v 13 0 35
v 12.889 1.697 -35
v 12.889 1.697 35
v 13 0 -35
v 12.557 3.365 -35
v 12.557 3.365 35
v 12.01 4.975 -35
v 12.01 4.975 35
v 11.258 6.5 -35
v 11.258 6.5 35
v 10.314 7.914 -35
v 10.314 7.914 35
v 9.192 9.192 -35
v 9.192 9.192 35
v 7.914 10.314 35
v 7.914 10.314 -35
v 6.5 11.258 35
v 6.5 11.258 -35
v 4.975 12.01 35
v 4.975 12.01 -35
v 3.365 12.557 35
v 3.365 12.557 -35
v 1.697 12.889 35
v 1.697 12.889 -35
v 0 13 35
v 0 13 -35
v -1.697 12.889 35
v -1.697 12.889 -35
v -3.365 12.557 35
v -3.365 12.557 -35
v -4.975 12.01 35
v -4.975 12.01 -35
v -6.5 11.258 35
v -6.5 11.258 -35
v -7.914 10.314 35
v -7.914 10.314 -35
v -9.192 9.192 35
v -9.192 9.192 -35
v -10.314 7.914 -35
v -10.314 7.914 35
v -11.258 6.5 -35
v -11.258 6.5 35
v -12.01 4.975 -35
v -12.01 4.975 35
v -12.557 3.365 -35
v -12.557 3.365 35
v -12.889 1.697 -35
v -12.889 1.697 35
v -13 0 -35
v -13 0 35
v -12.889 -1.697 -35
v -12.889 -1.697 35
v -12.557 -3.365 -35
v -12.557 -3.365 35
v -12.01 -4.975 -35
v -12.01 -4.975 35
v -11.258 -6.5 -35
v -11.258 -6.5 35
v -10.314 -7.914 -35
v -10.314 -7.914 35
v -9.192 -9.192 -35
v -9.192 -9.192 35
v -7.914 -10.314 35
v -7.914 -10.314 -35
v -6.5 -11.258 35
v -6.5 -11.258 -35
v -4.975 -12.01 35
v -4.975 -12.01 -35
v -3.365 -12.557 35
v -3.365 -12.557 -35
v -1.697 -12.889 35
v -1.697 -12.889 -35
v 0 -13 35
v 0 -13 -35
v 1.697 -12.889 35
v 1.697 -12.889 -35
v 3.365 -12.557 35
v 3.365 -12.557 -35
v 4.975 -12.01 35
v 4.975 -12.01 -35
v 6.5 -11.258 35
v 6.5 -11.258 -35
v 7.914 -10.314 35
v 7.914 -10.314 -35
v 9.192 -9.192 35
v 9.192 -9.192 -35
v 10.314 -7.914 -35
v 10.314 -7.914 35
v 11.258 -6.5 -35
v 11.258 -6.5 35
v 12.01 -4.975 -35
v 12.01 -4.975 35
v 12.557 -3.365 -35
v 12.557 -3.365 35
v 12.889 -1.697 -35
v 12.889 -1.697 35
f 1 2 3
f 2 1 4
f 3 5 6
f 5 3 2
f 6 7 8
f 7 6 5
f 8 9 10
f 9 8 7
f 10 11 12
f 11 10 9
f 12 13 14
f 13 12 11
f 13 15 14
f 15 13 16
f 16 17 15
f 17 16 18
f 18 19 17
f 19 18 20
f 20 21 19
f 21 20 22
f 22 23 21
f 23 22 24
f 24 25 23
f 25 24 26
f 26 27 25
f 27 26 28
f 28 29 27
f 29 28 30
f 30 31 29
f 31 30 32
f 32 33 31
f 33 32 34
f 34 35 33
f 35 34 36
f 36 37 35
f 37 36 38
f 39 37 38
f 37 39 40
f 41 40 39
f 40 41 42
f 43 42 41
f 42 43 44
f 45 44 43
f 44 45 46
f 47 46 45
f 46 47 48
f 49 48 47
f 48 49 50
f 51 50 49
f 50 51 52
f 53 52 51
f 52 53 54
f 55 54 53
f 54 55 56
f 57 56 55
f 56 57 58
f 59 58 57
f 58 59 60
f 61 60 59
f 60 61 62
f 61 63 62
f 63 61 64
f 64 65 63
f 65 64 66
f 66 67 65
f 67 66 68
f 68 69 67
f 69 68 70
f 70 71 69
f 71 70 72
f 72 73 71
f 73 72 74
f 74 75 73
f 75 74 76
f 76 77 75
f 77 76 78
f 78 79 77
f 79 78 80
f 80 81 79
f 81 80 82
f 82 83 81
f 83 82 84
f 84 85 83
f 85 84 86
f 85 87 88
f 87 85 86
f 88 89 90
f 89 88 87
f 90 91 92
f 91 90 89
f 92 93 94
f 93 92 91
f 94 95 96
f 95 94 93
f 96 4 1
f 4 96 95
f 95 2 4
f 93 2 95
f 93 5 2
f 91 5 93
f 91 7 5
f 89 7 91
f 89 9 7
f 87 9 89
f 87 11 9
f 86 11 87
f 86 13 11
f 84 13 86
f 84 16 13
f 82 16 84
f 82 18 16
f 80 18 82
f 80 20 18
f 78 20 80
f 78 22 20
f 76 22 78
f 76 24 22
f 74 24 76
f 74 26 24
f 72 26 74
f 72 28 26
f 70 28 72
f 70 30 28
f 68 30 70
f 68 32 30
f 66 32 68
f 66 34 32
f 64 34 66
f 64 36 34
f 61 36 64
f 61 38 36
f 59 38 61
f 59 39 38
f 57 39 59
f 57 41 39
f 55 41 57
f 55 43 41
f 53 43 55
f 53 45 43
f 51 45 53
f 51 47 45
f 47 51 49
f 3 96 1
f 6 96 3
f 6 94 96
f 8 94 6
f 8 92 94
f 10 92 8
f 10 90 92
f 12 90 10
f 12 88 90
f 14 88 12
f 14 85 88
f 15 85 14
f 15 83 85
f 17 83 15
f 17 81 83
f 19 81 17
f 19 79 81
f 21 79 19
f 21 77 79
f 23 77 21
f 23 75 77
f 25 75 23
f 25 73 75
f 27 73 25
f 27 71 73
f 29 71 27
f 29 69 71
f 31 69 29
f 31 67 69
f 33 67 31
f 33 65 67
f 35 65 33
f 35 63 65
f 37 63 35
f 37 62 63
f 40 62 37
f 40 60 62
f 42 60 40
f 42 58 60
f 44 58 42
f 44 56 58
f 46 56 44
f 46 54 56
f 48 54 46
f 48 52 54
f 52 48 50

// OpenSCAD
// ========================================
// a cylinder with radius 13 mm and height 70 mm
// NeuroCAD canonical IR; dimensions are millimetres
// ========================================
$fn = 48;

cylinder(r=13, h=70, center=true);
